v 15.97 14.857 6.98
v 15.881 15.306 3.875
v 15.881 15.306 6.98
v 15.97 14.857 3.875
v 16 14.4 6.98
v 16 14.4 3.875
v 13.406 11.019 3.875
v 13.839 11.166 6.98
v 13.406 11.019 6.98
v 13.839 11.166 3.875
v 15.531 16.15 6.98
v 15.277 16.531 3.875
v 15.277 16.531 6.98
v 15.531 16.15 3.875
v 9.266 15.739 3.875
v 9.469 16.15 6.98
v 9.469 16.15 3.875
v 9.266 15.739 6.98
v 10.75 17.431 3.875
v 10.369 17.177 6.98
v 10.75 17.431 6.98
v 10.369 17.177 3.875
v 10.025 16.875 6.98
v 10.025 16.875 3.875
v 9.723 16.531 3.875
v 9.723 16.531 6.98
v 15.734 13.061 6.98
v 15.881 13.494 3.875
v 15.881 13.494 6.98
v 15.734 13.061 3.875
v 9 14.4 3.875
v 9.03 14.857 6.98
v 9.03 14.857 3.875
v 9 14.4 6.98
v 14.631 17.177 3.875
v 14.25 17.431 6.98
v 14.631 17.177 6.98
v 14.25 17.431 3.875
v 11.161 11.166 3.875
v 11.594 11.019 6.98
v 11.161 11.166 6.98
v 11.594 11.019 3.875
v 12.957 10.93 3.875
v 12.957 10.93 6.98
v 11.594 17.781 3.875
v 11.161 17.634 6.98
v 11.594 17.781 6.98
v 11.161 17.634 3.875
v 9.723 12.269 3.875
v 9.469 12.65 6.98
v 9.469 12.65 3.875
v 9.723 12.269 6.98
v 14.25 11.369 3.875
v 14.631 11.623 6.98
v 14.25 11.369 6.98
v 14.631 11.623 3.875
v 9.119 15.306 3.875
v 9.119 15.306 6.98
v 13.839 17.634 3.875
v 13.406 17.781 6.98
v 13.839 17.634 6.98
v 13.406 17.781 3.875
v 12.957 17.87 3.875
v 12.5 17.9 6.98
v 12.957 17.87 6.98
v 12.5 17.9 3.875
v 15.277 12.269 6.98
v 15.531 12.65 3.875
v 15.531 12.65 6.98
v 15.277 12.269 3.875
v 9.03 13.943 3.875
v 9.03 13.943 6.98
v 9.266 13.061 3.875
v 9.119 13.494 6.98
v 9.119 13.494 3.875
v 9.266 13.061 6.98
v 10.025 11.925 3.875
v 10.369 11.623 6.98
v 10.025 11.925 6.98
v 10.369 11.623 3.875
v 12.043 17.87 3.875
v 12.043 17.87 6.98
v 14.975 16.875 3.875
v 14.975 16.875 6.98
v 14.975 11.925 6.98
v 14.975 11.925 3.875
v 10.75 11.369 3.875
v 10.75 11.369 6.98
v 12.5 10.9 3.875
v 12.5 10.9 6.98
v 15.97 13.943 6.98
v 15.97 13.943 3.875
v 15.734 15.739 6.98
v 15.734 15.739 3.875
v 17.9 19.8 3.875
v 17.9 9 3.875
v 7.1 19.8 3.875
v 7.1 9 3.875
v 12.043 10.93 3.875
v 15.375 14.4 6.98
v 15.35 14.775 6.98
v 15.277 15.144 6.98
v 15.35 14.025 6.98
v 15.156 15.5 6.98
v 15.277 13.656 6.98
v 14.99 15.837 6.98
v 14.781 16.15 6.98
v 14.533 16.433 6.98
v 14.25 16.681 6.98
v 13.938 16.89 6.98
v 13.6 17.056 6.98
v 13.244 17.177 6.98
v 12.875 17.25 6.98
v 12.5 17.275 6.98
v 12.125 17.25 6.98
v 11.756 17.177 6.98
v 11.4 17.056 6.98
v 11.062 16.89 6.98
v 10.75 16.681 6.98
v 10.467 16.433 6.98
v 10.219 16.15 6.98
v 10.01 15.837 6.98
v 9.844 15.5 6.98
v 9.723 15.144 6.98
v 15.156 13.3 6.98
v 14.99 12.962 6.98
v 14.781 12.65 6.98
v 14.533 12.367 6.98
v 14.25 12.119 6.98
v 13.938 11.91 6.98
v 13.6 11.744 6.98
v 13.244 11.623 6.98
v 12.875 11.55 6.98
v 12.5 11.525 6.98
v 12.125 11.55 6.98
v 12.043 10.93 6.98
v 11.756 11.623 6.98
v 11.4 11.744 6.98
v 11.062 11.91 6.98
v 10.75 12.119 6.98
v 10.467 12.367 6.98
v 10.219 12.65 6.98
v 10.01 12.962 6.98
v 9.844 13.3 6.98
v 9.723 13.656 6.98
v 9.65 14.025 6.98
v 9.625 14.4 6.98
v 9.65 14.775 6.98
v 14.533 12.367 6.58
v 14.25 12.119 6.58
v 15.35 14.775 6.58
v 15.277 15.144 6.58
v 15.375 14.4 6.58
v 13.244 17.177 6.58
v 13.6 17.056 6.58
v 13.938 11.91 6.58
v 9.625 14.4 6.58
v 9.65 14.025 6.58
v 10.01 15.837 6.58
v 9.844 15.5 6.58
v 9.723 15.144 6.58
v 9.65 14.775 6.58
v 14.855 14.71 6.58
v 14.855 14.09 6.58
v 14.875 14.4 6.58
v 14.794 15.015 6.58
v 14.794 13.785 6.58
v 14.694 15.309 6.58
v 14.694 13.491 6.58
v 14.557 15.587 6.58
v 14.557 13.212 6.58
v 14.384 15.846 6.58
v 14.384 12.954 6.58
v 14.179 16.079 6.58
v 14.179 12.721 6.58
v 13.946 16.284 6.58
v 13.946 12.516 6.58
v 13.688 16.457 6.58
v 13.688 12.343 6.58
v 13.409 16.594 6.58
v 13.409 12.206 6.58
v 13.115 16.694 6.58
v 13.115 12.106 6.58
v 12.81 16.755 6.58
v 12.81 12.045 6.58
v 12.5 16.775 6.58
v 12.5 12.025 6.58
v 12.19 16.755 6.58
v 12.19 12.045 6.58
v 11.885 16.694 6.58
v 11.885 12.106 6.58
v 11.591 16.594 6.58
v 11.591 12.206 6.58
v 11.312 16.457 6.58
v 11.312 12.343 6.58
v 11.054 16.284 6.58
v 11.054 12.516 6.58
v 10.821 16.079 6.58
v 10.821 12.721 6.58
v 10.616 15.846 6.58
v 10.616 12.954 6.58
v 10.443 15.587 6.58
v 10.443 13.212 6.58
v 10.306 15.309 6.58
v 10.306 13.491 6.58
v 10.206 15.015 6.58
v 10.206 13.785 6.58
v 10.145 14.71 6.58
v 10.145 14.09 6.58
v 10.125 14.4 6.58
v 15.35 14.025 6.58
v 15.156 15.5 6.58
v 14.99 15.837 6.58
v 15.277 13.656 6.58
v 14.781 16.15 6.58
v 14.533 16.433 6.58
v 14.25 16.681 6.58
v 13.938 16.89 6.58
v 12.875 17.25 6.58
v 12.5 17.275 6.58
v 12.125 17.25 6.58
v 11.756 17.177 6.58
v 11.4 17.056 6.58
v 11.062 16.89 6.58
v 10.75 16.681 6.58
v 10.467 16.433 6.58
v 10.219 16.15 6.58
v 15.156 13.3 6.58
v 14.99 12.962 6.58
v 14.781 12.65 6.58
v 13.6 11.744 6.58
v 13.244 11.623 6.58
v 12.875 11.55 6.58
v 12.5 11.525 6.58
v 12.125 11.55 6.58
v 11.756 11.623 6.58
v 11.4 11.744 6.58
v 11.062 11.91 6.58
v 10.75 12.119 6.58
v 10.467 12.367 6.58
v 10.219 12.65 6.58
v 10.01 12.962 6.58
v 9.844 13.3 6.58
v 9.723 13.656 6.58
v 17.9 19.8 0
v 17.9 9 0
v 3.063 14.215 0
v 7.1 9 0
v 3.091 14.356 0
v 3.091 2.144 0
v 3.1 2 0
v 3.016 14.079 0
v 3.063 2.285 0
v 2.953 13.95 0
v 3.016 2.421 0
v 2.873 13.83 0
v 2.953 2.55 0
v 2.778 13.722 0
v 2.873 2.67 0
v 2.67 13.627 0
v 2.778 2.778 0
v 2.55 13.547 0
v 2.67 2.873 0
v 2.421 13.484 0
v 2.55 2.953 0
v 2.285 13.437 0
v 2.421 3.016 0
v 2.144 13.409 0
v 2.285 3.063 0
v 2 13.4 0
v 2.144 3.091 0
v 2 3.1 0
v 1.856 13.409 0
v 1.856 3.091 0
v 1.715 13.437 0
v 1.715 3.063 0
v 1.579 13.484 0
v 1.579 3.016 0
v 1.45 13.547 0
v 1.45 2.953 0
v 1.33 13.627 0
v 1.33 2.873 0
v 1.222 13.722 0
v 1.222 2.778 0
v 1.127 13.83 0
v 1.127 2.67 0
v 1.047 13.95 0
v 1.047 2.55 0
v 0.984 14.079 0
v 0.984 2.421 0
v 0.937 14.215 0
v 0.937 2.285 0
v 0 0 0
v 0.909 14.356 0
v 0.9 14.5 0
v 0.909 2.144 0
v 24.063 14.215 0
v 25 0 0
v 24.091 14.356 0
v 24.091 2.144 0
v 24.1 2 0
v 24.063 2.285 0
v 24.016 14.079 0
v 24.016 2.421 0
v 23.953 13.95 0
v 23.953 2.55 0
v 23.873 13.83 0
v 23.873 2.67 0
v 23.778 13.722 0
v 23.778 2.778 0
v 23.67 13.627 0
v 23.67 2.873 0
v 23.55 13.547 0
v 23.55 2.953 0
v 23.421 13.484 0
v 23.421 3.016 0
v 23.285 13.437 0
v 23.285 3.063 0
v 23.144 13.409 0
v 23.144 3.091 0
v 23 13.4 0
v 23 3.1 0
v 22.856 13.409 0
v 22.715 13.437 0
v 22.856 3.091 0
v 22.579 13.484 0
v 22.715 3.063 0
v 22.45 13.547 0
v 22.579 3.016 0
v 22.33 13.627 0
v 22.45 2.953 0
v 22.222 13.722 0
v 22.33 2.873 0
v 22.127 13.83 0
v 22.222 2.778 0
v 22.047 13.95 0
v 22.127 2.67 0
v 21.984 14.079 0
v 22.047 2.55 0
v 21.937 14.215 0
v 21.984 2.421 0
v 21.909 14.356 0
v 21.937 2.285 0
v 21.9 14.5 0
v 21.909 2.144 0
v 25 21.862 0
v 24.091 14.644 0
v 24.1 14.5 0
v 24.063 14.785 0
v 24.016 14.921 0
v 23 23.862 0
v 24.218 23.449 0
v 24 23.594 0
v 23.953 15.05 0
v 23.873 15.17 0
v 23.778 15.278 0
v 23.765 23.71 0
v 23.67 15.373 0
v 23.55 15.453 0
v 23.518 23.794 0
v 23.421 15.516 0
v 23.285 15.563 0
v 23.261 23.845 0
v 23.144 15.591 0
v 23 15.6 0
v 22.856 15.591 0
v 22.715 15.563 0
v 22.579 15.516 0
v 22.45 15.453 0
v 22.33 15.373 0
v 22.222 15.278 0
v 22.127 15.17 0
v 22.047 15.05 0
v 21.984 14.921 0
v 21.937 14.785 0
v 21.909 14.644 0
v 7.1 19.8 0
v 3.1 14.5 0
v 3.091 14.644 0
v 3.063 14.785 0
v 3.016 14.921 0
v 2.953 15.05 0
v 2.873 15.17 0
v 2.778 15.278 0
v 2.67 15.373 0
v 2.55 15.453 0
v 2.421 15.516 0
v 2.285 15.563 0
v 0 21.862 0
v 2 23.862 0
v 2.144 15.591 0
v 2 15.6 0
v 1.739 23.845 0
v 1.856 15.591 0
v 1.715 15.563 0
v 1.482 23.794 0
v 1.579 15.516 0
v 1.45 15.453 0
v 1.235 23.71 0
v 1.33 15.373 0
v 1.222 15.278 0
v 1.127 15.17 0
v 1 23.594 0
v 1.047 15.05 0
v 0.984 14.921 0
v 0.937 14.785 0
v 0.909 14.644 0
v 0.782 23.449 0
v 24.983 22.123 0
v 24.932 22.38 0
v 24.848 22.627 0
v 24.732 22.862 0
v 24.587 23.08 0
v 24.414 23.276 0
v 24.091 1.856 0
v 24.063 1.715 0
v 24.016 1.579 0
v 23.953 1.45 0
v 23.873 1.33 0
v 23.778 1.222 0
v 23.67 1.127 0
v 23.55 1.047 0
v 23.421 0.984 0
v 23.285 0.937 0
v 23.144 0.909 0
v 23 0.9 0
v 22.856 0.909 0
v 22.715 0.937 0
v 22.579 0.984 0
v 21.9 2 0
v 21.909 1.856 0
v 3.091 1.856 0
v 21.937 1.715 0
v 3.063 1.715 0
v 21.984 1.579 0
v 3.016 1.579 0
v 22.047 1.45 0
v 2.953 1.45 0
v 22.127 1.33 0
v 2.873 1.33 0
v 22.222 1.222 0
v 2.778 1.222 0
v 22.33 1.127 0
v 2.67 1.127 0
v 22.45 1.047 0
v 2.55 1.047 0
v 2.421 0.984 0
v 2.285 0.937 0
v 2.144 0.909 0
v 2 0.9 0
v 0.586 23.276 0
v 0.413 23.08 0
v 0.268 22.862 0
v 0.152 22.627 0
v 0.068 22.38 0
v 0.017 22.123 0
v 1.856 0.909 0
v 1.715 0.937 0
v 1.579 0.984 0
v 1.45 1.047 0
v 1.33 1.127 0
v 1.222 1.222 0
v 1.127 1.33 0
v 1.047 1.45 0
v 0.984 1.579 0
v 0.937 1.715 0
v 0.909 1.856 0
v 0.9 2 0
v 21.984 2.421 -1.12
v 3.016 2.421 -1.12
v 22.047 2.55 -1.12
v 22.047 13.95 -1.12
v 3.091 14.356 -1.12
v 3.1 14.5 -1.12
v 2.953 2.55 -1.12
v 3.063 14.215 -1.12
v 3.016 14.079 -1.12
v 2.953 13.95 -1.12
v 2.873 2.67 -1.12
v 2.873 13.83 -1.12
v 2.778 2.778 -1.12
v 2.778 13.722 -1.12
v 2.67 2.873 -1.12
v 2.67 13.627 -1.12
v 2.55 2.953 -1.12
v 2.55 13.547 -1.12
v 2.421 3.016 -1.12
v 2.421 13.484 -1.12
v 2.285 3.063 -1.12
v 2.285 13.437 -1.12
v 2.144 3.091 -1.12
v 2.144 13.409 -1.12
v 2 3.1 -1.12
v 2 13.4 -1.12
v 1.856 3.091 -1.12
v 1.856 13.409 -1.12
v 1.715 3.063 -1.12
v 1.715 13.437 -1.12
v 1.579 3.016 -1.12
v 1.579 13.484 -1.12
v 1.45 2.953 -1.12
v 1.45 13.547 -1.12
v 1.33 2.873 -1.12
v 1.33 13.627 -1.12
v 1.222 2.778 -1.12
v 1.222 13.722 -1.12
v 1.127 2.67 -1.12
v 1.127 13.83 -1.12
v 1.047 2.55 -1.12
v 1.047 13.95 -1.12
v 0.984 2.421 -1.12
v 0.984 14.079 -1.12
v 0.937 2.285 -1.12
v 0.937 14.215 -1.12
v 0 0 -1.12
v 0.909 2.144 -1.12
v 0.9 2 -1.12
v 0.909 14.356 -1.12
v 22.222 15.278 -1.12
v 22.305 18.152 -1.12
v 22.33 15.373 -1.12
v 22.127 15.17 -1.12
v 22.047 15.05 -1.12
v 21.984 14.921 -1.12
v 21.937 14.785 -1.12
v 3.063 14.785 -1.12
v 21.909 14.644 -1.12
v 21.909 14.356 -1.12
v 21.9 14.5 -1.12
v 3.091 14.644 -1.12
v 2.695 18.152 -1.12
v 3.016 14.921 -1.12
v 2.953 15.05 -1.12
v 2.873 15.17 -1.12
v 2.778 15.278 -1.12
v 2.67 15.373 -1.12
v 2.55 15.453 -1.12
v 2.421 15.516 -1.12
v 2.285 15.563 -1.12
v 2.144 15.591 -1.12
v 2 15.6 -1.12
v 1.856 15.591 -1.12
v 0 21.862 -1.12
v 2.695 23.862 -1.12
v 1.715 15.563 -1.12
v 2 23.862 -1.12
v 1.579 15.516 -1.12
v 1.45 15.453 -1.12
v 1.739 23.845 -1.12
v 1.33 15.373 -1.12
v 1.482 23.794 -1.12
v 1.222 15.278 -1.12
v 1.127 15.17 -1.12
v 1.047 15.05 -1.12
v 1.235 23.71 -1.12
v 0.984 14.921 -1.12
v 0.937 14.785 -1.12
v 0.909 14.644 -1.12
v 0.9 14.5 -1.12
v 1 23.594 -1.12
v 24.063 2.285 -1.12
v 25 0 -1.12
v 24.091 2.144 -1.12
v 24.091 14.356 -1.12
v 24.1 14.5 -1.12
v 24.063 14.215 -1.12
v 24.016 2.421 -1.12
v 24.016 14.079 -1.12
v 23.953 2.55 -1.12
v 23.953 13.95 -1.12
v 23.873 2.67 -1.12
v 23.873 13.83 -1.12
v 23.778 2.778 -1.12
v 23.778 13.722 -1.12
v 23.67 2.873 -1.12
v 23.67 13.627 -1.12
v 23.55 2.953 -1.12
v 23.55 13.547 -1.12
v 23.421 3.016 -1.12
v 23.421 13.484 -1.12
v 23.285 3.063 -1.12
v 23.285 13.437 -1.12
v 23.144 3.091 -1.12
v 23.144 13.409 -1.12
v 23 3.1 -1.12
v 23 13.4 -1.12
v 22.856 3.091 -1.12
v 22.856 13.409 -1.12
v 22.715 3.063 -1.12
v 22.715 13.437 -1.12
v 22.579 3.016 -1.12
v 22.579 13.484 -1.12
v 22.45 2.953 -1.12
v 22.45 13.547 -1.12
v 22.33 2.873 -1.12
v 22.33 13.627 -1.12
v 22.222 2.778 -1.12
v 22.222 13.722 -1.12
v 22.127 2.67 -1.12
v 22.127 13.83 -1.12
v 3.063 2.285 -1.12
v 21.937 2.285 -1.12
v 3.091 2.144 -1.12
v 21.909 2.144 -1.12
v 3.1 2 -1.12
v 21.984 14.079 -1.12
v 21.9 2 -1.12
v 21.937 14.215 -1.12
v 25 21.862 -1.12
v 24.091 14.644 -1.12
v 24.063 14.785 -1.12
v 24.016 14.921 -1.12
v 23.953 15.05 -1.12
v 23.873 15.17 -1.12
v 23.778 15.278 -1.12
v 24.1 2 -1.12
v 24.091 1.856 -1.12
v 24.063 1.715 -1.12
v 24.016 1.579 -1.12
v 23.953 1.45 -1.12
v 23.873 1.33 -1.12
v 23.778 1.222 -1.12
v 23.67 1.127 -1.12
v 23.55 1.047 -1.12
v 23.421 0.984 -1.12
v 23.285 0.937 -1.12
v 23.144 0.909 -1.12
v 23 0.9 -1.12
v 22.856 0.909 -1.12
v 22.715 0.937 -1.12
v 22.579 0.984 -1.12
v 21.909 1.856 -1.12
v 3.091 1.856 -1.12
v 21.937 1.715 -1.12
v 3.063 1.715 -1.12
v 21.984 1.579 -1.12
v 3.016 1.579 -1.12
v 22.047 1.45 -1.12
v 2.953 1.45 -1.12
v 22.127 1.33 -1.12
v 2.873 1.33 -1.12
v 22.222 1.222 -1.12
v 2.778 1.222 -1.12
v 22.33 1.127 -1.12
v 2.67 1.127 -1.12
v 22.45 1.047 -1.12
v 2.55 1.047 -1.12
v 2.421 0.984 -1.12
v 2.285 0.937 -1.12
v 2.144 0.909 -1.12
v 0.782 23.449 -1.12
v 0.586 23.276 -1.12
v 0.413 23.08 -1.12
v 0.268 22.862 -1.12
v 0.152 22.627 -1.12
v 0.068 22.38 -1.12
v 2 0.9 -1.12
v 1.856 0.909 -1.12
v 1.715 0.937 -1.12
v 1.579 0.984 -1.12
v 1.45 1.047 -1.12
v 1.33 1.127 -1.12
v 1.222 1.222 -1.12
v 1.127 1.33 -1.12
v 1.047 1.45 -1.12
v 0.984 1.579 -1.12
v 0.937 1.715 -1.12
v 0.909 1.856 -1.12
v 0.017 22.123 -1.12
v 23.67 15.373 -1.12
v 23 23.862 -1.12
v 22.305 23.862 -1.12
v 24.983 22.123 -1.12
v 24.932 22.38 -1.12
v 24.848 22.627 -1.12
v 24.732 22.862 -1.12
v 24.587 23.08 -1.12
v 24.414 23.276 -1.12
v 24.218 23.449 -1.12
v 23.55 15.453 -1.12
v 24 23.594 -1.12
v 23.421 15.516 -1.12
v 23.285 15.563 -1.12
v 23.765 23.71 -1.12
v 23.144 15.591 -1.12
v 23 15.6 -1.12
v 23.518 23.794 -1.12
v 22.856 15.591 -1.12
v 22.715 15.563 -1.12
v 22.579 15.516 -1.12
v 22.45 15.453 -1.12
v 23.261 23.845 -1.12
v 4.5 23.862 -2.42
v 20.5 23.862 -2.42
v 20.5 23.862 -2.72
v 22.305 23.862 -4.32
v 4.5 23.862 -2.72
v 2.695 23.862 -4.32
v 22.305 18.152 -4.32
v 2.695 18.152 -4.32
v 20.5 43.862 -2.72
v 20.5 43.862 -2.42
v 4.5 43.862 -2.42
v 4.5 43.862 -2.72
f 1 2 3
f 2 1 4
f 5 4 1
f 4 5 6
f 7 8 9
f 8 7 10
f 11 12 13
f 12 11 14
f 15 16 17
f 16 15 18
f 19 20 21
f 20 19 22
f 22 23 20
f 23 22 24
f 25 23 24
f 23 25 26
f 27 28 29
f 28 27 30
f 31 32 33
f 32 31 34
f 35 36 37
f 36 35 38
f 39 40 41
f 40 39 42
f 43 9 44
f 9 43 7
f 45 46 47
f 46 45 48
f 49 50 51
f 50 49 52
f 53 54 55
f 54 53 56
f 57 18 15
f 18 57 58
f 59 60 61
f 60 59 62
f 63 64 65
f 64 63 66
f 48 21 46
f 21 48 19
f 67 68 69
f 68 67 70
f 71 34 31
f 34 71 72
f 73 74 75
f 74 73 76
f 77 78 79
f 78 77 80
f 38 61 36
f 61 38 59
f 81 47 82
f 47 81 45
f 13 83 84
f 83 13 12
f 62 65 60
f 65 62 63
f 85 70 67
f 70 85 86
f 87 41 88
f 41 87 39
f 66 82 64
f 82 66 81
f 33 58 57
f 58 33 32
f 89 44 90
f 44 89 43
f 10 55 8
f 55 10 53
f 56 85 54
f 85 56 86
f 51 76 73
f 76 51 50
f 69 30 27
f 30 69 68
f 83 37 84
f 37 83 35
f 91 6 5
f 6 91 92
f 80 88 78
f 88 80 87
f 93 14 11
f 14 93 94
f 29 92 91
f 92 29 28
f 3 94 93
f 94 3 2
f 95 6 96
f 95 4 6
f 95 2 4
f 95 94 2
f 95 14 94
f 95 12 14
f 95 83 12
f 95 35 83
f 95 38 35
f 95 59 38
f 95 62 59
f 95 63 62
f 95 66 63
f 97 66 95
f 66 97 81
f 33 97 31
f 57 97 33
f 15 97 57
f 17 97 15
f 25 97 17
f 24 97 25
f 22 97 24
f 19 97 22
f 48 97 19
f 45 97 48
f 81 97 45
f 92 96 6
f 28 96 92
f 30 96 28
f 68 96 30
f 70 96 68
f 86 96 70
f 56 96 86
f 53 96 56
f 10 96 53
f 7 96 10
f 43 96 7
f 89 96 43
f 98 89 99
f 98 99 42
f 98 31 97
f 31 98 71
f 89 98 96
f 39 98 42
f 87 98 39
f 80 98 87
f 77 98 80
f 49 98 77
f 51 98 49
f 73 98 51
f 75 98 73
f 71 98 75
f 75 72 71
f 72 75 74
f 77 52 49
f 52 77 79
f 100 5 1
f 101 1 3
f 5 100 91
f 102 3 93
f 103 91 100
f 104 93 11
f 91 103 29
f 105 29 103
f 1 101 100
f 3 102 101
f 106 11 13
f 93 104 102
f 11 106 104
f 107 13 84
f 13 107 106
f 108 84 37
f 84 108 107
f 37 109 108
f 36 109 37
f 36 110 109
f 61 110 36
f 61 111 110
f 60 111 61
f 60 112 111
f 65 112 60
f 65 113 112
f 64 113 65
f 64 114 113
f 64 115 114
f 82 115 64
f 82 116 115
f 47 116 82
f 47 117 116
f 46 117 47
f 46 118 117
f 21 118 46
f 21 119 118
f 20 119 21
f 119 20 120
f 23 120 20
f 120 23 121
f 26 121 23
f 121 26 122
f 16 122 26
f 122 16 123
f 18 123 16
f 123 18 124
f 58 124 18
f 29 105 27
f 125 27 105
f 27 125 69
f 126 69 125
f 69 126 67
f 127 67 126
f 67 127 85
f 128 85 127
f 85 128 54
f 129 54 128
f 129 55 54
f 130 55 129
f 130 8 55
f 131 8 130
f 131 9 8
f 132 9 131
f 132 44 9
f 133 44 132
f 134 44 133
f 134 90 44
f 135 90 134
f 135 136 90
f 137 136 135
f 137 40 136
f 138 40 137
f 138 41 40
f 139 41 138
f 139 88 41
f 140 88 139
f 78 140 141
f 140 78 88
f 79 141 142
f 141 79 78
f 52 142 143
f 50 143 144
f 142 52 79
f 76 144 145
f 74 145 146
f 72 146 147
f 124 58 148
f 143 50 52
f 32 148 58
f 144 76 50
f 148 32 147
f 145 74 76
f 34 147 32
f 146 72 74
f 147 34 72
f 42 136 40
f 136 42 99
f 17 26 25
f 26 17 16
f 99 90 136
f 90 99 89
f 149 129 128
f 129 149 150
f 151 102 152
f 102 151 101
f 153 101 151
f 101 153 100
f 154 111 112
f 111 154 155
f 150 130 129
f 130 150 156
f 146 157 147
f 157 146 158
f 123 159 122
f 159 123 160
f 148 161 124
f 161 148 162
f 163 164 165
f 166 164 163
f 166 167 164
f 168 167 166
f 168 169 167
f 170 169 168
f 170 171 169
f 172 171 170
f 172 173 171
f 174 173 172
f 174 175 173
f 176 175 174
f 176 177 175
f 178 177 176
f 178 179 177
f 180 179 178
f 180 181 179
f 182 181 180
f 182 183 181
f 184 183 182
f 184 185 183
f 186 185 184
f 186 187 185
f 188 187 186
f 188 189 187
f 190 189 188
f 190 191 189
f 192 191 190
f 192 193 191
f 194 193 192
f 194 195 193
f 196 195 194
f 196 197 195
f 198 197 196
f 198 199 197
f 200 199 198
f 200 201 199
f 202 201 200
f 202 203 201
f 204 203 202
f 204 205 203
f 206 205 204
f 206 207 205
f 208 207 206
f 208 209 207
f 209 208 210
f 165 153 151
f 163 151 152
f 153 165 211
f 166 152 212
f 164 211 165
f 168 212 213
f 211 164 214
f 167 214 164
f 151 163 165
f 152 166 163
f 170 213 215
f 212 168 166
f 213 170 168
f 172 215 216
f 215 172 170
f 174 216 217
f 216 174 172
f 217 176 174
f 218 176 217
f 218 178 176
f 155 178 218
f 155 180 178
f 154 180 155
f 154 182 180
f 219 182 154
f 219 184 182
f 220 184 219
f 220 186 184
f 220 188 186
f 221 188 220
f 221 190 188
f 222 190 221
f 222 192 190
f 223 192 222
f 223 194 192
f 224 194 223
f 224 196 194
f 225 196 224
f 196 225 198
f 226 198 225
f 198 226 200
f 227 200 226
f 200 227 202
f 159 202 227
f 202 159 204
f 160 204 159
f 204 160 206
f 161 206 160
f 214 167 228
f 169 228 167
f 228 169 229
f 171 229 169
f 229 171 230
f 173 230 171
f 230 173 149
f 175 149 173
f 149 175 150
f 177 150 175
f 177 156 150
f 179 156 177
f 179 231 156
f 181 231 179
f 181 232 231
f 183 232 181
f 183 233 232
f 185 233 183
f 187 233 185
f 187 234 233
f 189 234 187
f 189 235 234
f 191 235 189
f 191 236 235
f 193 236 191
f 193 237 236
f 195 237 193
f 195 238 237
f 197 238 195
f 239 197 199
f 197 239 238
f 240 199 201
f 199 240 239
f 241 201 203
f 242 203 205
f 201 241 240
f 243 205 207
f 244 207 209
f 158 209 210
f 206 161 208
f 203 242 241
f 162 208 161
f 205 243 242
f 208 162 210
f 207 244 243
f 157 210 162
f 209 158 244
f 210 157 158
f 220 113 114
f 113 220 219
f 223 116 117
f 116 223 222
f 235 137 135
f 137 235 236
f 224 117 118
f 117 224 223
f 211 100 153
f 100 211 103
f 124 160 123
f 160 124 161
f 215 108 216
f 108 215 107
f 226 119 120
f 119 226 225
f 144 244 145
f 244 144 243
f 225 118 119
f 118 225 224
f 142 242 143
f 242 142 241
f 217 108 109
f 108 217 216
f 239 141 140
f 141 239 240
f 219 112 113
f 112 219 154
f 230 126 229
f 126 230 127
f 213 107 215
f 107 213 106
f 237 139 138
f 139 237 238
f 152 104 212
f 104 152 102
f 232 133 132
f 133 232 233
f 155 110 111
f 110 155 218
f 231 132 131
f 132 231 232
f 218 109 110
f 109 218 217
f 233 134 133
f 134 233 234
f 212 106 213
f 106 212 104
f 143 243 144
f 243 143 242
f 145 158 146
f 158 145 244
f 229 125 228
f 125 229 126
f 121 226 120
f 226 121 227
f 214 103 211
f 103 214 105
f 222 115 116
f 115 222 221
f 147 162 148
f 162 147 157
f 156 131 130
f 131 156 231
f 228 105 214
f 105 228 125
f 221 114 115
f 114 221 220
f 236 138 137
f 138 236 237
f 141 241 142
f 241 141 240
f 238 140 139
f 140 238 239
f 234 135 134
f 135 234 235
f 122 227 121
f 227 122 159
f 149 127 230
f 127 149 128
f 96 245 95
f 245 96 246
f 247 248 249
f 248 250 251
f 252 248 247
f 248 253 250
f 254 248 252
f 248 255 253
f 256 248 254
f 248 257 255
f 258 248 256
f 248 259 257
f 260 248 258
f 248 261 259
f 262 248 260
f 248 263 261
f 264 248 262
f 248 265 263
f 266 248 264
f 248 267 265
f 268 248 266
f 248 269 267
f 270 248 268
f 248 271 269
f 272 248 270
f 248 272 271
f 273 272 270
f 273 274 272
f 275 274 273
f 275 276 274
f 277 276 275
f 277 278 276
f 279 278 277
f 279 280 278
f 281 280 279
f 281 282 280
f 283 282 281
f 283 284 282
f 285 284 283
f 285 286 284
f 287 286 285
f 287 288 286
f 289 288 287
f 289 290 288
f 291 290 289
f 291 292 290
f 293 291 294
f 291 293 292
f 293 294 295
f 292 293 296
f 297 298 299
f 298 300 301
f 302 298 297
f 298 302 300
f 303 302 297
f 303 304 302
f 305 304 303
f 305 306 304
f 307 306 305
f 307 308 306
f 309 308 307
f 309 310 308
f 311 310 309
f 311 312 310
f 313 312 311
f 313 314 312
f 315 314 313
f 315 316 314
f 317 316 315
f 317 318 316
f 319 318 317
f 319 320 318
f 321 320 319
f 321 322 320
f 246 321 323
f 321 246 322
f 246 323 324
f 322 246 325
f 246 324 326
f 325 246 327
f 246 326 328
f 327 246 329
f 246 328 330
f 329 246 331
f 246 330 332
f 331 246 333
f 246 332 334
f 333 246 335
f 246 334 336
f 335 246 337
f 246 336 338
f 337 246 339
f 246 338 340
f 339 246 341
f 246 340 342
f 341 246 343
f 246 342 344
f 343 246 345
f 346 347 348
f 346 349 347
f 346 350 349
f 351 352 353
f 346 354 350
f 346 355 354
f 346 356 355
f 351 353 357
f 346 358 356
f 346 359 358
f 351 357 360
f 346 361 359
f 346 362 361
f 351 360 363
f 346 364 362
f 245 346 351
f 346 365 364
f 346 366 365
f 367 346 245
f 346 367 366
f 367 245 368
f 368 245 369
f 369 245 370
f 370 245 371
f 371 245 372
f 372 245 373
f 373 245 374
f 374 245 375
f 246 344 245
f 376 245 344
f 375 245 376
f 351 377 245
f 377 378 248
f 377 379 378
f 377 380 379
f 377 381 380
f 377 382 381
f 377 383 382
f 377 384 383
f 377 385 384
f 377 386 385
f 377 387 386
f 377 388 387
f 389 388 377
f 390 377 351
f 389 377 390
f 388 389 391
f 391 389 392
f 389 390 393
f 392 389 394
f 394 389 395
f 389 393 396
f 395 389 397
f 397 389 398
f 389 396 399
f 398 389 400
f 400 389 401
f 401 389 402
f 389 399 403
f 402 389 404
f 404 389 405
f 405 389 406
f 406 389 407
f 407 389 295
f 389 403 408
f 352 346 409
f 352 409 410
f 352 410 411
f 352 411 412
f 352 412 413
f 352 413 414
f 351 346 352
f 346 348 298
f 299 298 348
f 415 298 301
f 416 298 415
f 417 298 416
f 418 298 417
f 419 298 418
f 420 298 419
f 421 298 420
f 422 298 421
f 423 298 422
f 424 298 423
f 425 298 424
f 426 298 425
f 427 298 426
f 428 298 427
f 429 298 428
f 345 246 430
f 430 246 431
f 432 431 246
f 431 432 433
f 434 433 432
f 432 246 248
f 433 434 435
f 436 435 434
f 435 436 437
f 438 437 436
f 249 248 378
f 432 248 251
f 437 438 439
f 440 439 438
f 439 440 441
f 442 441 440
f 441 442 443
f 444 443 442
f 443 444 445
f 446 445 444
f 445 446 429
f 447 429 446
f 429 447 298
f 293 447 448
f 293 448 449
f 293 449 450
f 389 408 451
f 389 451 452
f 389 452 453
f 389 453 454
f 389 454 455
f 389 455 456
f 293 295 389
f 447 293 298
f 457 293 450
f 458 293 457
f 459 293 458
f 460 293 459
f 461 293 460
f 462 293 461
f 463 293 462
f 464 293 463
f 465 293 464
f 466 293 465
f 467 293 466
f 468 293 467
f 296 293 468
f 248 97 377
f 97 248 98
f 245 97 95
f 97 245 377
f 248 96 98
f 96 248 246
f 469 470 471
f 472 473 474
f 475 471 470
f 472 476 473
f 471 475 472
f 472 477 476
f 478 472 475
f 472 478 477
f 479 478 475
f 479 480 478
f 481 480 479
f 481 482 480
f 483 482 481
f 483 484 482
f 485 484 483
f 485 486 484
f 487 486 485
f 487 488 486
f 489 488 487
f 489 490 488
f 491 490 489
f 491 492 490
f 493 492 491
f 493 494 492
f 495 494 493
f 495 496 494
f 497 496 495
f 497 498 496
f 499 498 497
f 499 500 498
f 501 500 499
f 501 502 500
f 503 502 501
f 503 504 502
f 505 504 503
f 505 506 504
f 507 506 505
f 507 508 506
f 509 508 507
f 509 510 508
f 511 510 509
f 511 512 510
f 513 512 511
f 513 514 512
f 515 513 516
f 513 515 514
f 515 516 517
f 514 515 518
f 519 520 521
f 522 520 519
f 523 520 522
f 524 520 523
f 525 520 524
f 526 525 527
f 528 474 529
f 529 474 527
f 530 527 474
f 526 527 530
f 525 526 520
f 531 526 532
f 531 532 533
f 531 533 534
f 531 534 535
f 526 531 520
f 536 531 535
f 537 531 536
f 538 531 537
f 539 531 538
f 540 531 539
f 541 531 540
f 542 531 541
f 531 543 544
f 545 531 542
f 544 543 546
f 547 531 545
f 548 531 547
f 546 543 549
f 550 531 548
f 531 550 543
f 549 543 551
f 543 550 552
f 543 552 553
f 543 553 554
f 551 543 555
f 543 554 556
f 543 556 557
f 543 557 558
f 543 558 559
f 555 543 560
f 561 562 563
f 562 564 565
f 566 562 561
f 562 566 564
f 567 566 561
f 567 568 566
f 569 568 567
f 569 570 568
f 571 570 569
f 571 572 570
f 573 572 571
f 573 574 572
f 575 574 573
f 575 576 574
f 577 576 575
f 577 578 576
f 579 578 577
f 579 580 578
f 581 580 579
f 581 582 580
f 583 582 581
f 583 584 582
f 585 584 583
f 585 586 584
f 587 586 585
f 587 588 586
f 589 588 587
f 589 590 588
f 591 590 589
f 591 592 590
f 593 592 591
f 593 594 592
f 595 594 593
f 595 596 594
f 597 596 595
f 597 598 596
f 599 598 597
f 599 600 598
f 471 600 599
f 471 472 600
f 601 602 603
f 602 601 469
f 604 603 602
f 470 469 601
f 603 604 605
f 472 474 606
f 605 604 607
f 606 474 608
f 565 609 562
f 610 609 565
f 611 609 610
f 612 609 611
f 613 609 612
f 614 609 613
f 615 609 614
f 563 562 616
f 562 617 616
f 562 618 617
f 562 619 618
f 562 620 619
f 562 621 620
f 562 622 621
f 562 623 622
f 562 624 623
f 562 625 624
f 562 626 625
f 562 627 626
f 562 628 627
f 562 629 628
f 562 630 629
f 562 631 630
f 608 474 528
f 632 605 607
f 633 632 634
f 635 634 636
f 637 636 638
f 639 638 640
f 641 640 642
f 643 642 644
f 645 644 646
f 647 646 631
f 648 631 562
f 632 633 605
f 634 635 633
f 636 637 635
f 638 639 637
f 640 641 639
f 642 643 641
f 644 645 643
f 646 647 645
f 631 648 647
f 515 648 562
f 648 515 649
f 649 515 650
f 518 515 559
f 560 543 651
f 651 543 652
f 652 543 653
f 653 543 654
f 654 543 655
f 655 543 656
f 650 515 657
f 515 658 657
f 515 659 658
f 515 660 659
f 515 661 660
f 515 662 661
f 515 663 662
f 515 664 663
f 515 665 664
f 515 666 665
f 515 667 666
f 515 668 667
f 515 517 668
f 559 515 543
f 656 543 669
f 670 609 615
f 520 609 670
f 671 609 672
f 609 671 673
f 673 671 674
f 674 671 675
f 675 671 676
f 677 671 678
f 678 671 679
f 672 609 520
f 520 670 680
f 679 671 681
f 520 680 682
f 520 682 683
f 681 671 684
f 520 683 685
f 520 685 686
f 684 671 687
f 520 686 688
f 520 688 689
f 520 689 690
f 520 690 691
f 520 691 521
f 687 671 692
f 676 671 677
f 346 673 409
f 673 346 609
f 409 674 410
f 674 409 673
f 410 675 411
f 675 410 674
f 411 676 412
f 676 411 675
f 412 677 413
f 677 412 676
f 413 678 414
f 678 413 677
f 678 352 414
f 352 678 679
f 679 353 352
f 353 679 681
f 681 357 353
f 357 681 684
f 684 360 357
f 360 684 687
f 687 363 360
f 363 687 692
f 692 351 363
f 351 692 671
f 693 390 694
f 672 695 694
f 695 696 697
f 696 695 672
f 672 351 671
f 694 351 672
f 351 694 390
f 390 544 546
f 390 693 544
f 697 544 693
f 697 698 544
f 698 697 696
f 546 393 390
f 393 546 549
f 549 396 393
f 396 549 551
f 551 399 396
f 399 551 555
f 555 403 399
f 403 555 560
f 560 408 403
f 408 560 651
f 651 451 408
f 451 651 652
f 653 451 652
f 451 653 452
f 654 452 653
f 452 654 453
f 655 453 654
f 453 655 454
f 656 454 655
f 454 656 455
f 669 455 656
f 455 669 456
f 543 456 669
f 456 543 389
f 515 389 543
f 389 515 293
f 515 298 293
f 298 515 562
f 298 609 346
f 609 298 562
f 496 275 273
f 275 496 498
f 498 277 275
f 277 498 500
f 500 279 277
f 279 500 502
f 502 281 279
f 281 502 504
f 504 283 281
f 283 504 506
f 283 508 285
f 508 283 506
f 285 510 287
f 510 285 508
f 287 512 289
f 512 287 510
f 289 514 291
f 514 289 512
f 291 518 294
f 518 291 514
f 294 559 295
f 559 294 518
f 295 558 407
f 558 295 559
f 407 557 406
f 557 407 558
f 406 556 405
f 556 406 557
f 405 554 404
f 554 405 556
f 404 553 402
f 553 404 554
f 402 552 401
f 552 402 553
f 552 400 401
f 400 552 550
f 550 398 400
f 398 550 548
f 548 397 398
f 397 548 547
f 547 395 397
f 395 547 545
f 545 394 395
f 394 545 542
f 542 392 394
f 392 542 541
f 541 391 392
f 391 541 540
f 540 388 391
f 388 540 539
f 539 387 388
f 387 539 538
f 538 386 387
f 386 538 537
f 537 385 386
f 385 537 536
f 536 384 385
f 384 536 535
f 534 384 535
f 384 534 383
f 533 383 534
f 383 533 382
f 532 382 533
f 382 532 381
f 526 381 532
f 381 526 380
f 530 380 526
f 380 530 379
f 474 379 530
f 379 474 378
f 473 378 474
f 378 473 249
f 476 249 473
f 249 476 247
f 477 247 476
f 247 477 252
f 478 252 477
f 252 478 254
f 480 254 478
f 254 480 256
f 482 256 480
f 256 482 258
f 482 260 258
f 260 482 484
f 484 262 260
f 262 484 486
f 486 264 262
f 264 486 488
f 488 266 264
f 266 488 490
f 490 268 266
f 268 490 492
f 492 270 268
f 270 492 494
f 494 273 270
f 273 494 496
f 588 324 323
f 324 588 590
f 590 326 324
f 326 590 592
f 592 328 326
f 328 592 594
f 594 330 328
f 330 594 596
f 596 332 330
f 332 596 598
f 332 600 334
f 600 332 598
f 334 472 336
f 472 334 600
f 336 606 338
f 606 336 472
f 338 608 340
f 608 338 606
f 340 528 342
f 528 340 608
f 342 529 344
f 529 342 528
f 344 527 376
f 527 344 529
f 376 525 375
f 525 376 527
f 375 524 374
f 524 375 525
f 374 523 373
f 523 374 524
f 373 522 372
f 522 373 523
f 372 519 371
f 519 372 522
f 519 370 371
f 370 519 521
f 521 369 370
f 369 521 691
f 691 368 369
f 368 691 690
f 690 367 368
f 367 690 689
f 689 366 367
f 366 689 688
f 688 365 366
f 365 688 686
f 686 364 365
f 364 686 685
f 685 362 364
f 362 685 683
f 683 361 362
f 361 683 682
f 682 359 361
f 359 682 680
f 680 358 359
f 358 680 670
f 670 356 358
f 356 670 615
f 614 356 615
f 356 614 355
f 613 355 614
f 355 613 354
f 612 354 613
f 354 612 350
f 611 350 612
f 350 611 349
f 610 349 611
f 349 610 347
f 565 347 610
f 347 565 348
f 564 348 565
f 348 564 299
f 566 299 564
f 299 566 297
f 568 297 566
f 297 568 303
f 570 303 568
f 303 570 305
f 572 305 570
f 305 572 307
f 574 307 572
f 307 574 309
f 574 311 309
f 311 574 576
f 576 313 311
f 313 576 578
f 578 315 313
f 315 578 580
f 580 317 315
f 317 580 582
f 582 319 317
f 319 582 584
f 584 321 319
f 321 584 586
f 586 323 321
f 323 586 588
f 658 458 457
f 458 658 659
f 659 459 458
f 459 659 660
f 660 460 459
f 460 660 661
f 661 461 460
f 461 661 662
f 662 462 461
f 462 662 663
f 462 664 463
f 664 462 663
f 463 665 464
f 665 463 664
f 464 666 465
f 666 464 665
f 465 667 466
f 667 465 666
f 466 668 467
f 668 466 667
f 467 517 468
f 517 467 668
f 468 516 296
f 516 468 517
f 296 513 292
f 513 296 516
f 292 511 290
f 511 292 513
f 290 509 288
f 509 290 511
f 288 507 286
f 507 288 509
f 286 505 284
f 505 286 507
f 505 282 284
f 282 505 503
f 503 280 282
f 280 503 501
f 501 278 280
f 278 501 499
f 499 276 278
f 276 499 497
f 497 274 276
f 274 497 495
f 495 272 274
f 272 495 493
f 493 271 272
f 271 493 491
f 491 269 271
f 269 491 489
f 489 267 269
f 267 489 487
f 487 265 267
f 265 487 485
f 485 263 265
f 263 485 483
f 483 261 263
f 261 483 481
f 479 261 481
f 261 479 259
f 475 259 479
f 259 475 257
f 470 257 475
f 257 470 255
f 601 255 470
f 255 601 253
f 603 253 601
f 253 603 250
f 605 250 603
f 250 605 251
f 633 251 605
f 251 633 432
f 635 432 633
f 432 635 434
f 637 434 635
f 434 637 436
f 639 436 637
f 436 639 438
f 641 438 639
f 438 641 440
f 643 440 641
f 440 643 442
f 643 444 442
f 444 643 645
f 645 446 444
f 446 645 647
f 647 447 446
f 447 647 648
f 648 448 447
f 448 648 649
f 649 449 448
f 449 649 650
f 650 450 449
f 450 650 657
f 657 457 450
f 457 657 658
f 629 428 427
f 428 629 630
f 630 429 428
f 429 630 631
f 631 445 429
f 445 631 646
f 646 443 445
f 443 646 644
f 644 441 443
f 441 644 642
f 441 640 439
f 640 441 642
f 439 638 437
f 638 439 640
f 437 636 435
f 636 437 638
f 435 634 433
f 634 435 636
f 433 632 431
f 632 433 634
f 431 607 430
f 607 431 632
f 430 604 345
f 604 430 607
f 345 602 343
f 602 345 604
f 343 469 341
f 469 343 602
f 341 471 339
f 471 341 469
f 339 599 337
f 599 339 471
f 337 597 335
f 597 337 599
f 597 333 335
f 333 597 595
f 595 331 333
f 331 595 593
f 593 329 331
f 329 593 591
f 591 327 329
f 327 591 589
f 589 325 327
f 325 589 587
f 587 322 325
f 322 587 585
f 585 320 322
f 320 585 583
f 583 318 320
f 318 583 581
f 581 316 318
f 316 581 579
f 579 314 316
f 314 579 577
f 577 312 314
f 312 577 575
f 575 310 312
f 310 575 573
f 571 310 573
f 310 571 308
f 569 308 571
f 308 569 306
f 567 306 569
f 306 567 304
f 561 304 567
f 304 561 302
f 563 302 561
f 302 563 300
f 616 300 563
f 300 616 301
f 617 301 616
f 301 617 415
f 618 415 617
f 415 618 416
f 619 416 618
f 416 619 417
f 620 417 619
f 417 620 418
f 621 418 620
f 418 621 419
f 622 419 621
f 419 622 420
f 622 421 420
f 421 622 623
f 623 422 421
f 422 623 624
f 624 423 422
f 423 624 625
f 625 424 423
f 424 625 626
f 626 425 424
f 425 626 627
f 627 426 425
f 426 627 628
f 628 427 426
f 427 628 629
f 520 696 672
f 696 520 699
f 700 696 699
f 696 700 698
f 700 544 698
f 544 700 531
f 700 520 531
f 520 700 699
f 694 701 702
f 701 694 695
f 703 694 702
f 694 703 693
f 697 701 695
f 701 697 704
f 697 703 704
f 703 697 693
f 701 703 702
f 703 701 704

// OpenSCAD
// picam3_module.scad
// Reference model of the Raspberry Pi Camera Module 3 (standard lens, IMX708).
// This is the GROUND TRUTH the top-frame mount will be designed around.
//
// Source: Raspberry Pi "Camera Module 3 standard mechanical drawing"
//   https://datasheets.raspberrypi.com/camera/camera-module-3-standard-mechanical-drawing.pdf
// Values marked (est) were scaled off the drawing, not dimensioned on it.
// Not checked against a physical board yet; clone/Arducam boards may differ.
//
// Axes (viewed from the lens side, as in the drawing's front view):
//   X = across the board, 0 = left edge
//   Y = up the board, 0 = bottom edge (the end with the 8.9 mm notch);
//       the FPC connector and ribbon are at the TOP edge (+Y)
//   Z = toward the scene, 0 = PCB front face (lens side); the PCB is z -1.12..0
//
// Preview:  openscad -o picam3_module.png --render --viewall --autocenter \
//             --imgsize=950,850 --colorscheme=Tomorrow picam3_module.scad

$fn = 48;

/* ---------- Drawing dimensions ---------- */
pcb_w = 25;       // X
pcb_h = 23.862;   // Y
pcb_t = 1.12;
pcb_r = 2.0;      // (est) radius of the two top corners

// M2 mounting holes: 21 x 12.5 pattern
hole_d   = 2.2;
pad_d    = 4.75;   // copper keep-out ring around each hole
hole_in  = 2.0;    // hole centres from the left/right edges
hole_y0  = 2.0;    // lower pair, from the bottom edge
hole_y1  = 14.5;   // upper pair, from the bottom edge

// Lens: on the board's vertical centreline
lens_x     = pcb_w / 2;   // 12.5
lens_y     = 14.4;
housing_sq = 10.8;        // square sensor/lens housing
housing_h  = 3.875;       // housing front above the PCB front face
barrel_d   = 7.0;         // (est) outer diameter of the round lens barrel
aperture_d = 5.75;
lens_h     = 6.98;        // lens tip above the PCB front face

// Lens-side notch / flex area below the housing
notch_w = 8.9;
notch_h = 4.0;            // (est) from the 3.3 / 4 / 7.3 stack

// 15-pin FPC connector on the back, at the top edge
fpc_w = 19.61;
fpc_h = 5.71;             // along Y, down from the top edge
fpc_d = 11.3 - lens_h - pcb_t;   // depth behind the PCB back face (~3.2)

// Ribbon: 15-pin, 1 mm pitch, exits the top edge
ribbon_w = 16.0;
ribbon_t = 0.3;

// Field of view (standard lens). Wide lens is 102 x 67 deg.
// The sensor's long axis is X: to put the wide view along the bed's travel (Y),
// the mount turns the board 90 deg.
fov_h = 66;   // across X
fov_v = 41;   // along Y

/* ---------- Derived (used by the mount) ---------- */
holes = [[hole_in, hole_y0], [pcb_w - hole_in, hole_y0],
         [hole_in, hole_y1], [pcb_w - hole_in, hole_y1]];
housing_y0 = lens_y - housing_sq/2;
back_z     = -pcb_t;
fpc_back_z = -pcb_t - fpc_d;

/* ---------- Model ---------- */
module pcb_outline()
    hull() {
        square([pcb_w, 0.01]);
        translate([pcb_r, pcb_h - pcb_r]) circle(r = pcb_r);
        translate([pcb_w - pcb_r, pcb_h - pcb_r]) circle(r = pcb_r);
    }

module pcb()
    color("ForestGreen")
    translate([0, 0, -pcb_t])
    linear_extrude(pcb_t)
    difference() {
        pcb_outline();
        for (h = holes) translate(h) circle(d = hole_d);
    }

module housing() {
    color("DimGray")
    translate([lens_x - housing_sq/2, housing_y0, 0]) cube([housing_sq, housing_sq, housing_h]);
    color("Black")
    translate([lens_x, lens_y, housing_h]) difference() {
        cylinder(d = barrel_d, h = lens_h - housing_h);
        translate([0, 0, lens_h - housing_h - 0.4]) cylinder(d = aperture_d, h = 1);
    }
    color("SteelBlue")
    translate([lens_x, lens_y, lens_h - 0.5]) cylinder(d = aperture_d - 1, h = 0.1);
}

module fpc_connector()
    color("Beige")
    translate([(pcb_w - fpc_w)/2, pcb_h - fpc_h, fpc_back_z]) cube([fpc_w, fpc_h, fpc_d]);

module ribbon(len = 20)
    color("Orange", 0.7)
    translate([(pcb_w - ribbon_w)/2, pcb_h - fpc_h/2, fpc_back_z + fpc_d/2])
    cube([ribbon_w, fpc_h/2 + len, ribbon_t]);

// Light cone of the lens, for checking that the mount stays out of the view
module fov_cone(dist = 60)
    color("Yellow", 0.15)
    translate([lens_x, lens_y, lens_h])
    hull() {
        cube(0.01, center = true);
        translate([0, 0, dist])
            cube([2 * dist * tan(fov_h/2), 2 * dist * tan(fov_v/2), 0.01], center = true);
    }

module picam3(show_ribbon = true) {
    pcb();
    housing();
    fpc_connector();
    if (show_ribbon) ribbon();
}

picam3();
%fov_cone(25);
